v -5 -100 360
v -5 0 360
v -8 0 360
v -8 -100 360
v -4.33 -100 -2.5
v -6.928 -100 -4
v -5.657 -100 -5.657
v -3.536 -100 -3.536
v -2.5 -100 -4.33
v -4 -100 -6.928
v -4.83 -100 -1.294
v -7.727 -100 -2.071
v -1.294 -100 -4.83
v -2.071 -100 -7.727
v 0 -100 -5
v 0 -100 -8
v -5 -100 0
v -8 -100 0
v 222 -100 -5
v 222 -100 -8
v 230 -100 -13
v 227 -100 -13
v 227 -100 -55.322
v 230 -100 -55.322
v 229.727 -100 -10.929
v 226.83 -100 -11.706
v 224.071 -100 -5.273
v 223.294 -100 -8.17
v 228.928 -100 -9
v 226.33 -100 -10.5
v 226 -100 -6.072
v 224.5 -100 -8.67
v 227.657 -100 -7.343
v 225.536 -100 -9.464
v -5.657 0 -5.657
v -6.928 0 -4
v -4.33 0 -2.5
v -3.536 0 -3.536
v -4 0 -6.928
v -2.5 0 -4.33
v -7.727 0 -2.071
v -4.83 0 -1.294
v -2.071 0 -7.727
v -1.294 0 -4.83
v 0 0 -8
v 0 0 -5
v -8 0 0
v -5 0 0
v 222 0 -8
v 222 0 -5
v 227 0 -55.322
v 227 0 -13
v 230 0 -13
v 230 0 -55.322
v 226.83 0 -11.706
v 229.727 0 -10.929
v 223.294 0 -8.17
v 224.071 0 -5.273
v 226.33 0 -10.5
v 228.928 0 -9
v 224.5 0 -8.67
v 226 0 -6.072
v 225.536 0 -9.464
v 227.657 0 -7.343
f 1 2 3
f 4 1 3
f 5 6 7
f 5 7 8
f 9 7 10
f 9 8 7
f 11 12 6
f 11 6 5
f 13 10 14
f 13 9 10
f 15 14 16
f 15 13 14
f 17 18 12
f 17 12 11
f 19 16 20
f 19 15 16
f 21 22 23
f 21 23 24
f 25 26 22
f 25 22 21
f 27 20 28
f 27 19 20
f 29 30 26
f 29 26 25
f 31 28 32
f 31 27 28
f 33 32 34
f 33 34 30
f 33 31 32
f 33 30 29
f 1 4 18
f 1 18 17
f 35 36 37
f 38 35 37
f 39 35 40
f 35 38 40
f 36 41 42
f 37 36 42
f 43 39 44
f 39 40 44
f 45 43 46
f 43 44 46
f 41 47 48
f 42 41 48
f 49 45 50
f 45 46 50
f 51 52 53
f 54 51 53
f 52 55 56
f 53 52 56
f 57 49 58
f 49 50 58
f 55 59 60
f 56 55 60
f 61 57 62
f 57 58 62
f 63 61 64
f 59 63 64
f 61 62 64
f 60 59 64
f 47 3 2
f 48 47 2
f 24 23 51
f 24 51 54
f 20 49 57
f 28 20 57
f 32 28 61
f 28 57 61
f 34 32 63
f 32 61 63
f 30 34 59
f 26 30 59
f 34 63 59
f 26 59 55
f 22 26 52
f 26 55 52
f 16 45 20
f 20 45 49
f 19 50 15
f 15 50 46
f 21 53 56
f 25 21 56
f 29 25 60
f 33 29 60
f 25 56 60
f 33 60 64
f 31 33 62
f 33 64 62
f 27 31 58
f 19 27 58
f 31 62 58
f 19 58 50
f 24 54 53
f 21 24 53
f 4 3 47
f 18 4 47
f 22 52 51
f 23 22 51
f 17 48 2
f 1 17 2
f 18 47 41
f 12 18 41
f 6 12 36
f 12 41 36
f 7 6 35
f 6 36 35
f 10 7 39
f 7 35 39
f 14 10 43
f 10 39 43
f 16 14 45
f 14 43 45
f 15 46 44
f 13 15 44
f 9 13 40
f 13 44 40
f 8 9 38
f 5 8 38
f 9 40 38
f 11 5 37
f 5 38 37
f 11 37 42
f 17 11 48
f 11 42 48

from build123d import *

# Parameters (mm, degrees)
F1_DEPTH = 100


with BuildPart() as f1:
    # F0 (on Front) → F1 (new body)
    with BuildSketch(Plane.XZ):
        with BuildLine():
            ThreePointArc((0, -5), (-3.535534, -3.535534), (-5, 0))
            Line((-5, 0), (-5, 360))
            Line((-5, 360), (-8, 360))
            Line((-8, 360), (-8, 0))
            ThreePointArc((-8, 0), (-5.656854, -5.656854), (0, -8))
            Line((0, -8), (222, -8))
            ThreePointArc((222, -8), (225.535534, -9.464466), (227, -13))
            Line((227, -13), (227, -55.321693))
            Line((227, -55.321693), (230, -55.321693))
            Line((230, -55.321693), (230, -13))
            ThreePointArc((230, -13), (227.656854, -7.343146), (222, -5))
            Line((222, -5), (0, -5))
        make_face()
    extrude(amount=F1_DEPTH)


solid = f1.part
